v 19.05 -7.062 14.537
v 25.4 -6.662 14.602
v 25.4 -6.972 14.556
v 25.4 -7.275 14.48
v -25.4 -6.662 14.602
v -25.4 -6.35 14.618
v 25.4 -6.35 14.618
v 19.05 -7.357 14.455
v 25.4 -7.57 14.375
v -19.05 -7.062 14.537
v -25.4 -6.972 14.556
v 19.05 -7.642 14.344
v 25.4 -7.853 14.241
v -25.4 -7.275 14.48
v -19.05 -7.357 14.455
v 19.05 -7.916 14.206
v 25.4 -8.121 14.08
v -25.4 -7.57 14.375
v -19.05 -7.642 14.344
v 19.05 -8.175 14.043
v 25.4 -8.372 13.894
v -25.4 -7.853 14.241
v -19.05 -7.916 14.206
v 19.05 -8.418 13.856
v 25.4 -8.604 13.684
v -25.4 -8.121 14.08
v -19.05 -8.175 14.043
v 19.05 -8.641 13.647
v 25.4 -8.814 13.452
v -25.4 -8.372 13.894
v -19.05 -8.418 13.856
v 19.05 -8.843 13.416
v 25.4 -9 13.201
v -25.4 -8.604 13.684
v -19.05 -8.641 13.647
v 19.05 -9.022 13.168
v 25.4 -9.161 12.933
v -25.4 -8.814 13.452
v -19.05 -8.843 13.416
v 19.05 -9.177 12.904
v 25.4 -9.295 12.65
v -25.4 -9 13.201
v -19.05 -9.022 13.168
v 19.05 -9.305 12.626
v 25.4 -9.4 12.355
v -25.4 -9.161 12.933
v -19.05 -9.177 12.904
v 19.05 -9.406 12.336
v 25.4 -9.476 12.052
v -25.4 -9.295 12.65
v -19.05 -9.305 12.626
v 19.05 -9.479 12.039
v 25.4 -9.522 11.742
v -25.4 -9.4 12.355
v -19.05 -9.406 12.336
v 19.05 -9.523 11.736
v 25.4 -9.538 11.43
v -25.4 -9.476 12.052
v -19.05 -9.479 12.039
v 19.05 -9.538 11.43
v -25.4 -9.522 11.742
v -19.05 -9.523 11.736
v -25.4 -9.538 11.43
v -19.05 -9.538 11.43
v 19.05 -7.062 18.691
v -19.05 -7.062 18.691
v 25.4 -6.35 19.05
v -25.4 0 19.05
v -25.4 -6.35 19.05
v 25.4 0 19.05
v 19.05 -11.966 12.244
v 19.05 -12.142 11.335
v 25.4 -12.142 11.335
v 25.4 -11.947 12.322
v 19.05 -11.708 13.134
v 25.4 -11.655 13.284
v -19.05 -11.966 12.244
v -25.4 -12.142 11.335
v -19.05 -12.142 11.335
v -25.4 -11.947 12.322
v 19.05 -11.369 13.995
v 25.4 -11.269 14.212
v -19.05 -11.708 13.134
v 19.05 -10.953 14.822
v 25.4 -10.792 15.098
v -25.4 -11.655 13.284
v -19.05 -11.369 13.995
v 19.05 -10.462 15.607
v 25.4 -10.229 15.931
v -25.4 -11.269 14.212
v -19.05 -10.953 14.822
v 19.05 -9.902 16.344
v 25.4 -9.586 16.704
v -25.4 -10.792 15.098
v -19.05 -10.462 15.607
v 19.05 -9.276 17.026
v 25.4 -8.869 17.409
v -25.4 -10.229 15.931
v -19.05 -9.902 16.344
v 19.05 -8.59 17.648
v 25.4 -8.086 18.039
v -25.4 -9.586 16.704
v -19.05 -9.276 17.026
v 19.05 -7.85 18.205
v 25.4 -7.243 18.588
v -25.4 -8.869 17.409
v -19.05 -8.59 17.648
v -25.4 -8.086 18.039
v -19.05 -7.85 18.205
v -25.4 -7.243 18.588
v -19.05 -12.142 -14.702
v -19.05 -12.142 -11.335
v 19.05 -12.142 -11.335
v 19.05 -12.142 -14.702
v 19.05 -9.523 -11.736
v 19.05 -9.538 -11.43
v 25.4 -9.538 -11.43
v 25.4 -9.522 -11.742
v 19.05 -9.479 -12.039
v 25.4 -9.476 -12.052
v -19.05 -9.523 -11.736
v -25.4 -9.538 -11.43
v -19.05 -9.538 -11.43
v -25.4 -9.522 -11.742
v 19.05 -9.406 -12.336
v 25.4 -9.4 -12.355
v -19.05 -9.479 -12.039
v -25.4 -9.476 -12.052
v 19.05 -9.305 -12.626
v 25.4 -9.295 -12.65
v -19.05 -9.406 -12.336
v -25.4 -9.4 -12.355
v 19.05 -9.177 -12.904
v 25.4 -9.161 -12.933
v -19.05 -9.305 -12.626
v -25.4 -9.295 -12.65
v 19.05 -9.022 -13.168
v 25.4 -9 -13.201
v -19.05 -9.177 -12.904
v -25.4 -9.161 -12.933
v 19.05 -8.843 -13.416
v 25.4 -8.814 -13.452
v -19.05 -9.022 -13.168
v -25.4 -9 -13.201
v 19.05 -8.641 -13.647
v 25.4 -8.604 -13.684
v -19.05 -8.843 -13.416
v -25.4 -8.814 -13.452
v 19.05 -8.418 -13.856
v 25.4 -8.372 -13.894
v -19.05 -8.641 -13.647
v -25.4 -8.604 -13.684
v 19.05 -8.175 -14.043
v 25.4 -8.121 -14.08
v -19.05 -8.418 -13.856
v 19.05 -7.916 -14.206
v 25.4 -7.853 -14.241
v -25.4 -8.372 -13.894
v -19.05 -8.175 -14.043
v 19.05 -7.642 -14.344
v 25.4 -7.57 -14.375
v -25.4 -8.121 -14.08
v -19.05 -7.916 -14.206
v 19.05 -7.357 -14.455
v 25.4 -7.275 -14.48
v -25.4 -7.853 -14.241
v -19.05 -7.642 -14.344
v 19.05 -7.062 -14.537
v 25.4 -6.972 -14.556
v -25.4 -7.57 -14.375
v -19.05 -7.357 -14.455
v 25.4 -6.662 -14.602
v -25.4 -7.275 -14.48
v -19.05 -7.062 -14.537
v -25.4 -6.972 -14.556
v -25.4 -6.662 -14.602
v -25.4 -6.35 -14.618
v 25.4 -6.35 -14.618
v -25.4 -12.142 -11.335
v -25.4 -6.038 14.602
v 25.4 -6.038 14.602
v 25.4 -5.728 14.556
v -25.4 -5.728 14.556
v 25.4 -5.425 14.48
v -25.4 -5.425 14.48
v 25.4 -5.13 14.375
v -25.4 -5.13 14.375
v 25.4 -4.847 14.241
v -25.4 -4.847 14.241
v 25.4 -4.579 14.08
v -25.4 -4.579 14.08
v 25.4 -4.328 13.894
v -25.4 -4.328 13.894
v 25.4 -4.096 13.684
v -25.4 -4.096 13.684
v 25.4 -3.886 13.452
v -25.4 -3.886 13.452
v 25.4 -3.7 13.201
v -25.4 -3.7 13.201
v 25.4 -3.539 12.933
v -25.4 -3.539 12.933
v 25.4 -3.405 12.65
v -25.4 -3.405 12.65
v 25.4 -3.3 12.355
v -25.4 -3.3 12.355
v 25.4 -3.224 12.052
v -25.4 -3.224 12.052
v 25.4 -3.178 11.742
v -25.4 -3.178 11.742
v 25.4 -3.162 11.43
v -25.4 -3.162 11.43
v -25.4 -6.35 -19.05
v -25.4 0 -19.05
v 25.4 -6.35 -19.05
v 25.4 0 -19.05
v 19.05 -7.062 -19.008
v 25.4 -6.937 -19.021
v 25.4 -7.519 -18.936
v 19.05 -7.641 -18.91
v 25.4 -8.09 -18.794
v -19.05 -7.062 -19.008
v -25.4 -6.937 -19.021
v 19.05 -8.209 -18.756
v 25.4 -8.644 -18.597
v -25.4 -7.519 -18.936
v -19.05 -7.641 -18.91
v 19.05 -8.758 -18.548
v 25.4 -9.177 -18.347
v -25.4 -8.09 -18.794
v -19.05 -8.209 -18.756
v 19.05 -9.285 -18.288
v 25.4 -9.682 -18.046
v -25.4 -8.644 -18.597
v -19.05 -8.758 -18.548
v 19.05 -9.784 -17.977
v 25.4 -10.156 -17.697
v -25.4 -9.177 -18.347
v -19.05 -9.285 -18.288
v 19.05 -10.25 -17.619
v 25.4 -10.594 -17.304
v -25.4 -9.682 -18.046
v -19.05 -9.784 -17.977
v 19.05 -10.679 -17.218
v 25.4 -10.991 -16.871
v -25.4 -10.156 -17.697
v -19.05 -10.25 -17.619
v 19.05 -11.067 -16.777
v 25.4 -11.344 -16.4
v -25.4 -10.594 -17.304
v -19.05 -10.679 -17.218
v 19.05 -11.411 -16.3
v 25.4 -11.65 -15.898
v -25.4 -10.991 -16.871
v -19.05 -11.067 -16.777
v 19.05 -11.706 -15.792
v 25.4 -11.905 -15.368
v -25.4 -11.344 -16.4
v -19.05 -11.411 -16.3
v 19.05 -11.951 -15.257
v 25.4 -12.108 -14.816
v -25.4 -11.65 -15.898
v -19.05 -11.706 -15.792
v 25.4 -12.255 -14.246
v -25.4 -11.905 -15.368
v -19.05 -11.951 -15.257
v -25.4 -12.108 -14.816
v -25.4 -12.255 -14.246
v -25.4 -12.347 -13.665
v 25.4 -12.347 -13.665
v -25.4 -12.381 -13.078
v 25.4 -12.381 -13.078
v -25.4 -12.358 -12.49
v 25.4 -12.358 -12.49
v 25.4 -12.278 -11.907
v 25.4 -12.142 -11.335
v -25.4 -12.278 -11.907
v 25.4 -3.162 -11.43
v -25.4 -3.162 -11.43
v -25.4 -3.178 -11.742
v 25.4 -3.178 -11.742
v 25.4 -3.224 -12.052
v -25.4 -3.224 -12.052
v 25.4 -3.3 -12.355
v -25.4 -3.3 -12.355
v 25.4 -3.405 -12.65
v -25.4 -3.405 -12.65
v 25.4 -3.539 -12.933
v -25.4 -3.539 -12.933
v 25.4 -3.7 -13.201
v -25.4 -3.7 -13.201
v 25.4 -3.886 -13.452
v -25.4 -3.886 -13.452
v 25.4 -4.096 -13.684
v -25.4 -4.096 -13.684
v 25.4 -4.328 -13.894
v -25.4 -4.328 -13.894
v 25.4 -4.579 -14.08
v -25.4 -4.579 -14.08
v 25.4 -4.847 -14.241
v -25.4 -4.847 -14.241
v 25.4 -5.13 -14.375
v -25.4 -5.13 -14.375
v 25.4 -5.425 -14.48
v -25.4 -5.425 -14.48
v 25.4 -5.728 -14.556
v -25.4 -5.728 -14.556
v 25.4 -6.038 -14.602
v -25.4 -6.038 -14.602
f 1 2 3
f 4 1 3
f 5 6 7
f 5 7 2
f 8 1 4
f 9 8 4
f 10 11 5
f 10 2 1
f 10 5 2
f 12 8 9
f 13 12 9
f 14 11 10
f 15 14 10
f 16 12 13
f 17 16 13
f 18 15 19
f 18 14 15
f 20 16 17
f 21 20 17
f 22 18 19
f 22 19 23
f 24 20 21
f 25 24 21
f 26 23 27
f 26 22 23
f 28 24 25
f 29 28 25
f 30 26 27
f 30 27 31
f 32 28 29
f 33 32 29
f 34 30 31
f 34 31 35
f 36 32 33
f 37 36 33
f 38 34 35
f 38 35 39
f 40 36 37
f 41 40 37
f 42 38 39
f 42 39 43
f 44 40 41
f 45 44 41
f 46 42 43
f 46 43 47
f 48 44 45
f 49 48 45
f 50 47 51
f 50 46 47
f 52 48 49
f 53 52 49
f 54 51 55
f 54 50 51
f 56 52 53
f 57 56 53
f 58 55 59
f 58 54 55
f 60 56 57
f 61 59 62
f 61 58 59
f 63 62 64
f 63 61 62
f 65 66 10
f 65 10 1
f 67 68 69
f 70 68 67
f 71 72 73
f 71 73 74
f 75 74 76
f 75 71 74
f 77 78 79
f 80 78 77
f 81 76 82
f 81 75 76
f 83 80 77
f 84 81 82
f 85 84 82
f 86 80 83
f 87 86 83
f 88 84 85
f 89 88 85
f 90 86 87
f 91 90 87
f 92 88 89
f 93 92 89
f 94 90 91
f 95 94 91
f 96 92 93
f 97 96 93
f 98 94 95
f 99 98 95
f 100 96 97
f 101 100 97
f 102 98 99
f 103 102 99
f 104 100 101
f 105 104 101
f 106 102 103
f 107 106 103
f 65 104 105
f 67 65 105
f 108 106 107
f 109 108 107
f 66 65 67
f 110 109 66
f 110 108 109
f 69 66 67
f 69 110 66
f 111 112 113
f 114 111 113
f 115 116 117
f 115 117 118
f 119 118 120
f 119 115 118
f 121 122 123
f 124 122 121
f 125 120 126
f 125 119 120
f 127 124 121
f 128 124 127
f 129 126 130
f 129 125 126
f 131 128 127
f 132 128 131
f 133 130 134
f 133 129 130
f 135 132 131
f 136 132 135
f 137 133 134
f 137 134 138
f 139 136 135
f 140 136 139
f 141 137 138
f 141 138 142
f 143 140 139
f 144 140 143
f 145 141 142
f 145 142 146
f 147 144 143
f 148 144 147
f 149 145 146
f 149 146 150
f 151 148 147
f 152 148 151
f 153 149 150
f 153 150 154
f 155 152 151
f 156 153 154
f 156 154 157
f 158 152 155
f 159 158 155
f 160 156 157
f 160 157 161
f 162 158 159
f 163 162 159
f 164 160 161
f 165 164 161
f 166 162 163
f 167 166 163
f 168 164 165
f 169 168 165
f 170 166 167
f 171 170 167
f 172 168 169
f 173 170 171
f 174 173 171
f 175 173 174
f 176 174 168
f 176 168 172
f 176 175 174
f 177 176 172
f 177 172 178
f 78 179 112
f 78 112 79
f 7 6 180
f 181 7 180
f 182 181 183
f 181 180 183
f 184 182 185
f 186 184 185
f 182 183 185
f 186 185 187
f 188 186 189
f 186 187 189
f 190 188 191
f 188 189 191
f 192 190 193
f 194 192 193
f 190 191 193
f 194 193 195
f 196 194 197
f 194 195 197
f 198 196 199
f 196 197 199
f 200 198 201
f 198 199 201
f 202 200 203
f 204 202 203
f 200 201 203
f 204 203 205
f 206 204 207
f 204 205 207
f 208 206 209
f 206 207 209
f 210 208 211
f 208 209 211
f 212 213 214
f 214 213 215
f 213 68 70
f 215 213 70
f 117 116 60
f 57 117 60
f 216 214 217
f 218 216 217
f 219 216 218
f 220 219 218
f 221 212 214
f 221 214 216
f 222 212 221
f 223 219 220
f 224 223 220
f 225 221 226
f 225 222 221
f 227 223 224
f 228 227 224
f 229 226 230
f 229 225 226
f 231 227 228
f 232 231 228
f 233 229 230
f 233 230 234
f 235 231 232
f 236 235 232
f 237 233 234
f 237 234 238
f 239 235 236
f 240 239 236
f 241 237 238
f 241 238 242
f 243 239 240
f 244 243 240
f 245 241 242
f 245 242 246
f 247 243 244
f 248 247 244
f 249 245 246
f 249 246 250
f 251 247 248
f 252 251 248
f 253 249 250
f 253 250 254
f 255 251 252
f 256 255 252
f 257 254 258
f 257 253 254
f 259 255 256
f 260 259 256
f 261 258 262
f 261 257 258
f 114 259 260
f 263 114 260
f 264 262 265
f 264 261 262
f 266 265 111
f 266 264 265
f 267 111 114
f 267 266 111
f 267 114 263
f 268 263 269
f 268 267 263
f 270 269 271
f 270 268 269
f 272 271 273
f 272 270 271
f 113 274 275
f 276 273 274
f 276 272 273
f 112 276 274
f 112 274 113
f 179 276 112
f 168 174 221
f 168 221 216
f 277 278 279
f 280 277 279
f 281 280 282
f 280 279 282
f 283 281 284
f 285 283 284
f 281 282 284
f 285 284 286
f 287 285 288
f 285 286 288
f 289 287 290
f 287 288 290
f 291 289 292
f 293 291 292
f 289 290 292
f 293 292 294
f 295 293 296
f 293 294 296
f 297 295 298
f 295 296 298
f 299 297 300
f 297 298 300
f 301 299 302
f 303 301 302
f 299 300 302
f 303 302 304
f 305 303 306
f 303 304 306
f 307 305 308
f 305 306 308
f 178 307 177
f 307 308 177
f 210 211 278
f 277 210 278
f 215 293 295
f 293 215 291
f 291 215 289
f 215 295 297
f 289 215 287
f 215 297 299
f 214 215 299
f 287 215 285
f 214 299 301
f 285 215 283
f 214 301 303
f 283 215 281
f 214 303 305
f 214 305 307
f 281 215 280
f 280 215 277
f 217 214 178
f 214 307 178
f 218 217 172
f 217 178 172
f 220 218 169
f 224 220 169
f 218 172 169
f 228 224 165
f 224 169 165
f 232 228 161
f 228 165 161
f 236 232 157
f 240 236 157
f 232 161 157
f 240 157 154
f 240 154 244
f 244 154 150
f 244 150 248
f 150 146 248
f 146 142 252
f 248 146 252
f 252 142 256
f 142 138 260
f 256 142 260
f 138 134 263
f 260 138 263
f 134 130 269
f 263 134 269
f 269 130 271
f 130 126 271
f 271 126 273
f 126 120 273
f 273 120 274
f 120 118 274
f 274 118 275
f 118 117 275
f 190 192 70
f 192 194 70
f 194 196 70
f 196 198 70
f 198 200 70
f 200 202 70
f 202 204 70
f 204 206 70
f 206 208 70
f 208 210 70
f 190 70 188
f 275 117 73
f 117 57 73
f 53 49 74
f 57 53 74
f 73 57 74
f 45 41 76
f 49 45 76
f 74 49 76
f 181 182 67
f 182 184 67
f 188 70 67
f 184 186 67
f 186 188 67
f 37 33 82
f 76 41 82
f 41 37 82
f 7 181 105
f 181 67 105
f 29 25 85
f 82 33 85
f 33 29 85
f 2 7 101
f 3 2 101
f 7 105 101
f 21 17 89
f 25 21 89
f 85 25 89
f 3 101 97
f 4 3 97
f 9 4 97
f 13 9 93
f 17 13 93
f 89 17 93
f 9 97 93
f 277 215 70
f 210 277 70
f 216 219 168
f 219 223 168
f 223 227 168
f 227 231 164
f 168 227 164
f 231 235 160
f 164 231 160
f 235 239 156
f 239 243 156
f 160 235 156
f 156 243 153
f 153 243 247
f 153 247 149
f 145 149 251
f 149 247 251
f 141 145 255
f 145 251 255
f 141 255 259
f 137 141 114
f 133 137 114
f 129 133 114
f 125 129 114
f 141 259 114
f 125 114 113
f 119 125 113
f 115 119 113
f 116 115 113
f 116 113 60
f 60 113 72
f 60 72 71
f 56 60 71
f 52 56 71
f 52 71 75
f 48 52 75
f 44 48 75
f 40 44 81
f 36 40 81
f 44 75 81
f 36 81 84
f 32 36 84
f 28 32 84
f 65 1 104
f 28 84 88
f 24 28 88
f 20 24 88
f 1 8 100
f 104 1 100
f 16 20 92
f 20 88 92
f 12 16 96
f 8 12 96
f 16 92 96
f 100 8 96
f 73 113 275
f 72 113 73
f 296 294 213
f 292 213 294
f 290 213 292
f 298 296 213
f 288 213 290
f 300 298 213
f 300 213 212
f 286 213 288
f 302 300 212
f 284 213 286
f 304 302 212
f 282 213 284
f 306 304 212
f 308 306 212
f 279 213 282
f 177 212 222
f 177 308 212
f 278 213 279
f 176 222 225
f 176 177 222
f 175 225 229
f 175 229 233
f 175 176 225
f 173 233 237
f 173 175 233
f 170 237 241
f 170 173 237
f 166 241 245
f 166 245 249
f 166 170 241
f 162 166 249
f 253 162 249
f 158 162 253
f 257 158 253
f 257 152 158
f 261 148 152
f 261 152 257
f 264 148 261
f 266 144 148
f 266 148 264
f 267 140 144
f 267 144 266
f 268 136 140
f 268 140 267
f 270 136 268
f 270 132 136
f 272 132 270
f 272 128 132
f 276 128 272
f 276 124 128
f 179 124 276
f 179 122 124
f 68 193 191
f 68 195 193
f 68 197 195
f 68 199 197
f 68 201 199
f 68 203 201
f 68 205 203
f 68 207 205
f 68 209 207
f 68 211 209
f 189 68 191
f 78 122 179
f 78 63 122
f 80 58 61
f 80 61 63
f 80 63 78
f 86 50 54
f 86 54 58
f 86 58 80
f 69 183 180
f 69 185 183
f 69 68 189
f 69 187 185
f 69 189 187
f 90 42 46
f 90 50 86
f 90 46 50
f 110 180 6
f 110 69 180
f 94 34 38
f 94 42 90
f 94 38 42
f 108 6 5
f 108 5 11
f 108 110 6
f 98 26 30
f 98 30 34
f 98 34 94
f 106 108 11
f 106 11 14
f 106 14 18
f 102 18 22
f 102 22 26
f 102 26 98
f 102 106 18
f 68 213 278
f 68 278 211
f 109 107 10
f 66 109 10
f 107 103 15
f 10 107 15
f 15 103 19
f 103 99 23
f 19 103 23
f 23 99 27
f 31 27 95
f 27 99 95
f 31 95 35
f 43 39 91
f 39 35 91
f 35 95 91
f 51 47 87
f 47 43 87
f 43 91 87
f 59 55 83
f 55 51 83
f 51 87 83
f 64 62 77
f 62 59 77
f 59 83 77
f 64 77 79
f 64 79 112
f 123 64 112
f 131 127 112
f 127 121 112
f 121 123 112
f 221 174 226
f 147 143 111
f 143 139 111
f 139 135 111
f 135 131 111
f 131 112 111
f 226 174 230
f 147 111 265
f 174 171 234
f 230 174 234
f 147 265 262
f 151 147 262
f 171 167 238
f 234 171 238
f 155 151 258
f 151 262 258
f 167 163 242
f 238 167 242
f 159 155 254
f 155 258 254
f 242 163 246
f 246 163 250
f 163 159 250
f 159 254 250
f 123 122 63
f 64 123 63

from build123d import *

# Parameters (mm, degrees)
F0_W     = 50.8
F0_H     = 38.1
F1_DEPTH = 6.35
F3_DEPTH = 50.8
F5_DEPTH = 101.6
F6_W     = 38.1
F6_H     = 22.6706631617
F6_H_2   = 10.8896684192
F7_DEPTH = 5.08


with BuildPart() as f1:
    # F0 (on Front) → F1 (new body)
    with BuildSketch(Plane.XZ):
        Rectangle(F0_W, F0_H)
    extrude(amount=F1_DEPTH)

    # F2 (on face) → F3 (join)
    with BuildSketch(Plane(origin=(-25.4, 0, 0), x_dir=(0, -1, 0), z_dir=(-1, 0, 0))):
        with BuildLine():
            ThreePointArc((6.35, 14.6177), (8.6040442864, 13.6840442864), (9.5377, 11.43))
            ThreePointArc((9.5377, 11.43), (8.6040442864, 9.1759557136), (6.35, 8.2423))
            Line((6.35, 8.2423), (6.35, -8.2423))
            ThreePointArc((6.35, -8.2423), (8.6040442864, -9.1759557136), (9.5377, -11.43))
            ThreePointArc((9.5377, -11.43), (8.6040442864, -13.6840442864), (6.35, -14.6177))
            Line((6.35, -14.6177), (6.35, -19.05))
            ThreePointArc((6.35, -19.05), (11.173439943, -16.6397561834), (12.1419066563, -11.3353315808))
            Line((12.1419066563, -11.3353315808), (12.1419066563, 11.3353315808))
            ThreePointArc((12.1419066563, 11.3353315808), (10.2292171372, 15.9308663055), (6.35, 19.05))
            Line((6.35, 19.05), (6.35, 14.6177))
        make_face()
    extrude(amount=-F3_DEPTH)

    # F4 (on face) → F5 (cut)
    with BuildSketch(Plane(origin=(-25.4, 0, 0), x_dir=(0, -1, 0), z_dir=(-1, 0, 0))):
        with BuildLine():
            Line((6.35, 8.2423), (6.35, 14.6177))
            ThreePointArc((6.35, 14.6177), (4.0959557136, 13.6840442864), (3.1623, 11.43))
            ThreePointArc((3.1623, 11.43), (4.0959557136, 9.1759557136), (6.35, 8.2423))
        make_face()
        with BuildLine():
            ThreePointArc((6.35, 8.2423), (8.6040442864, 9.1759557136), (9.5377, 11.43))
            ThreePointArc((9.5377, 11.43), (8.6040442864, 13.6840442864), (6.35, 14.6177))
            Line((6.35, 14.6177), (6.35, 8.2423))
        make_face()
        with BuildLine():
            Line((6.35, -14.6177), (6.35, -8.2423))
            ThreePointArc((6.35, -8.2423), (4.0959557136, -9.1759557136), (3.1623, -11.43))
            ThreePointArc((3.1623, -11.43), (4.0959557136, -13.6840442864), (6.35, -14.6177))
        make_face()
        with BuildLine():
            ThreePointArc((6.35, -14.6177), (8.6040442864, -13.6840442864), (9.5377, -11.43))
            ThreePointArc((9.5377, -11.43), (8.6040442864, -9.1759557136), (6.35, -8.2423))
            Line((6.35, -8.2423), (6.35, -14.6177))
        make_face()
        with BuildLine():
            Line((9.5377, -11.43), (9.5377, 11.43))
            ThreePointArc((9.5377, 11.43), (8.6040442864, 9.1759557136), (6.35, 8.2423))
            ThreePointArc((6.35, 8.2423), (4.0959557136, 9.1759557136), (3.1623, 11.43))
            Line((3.1623, 11.43), (3.1623, -11.43))
            ThreePointArc((3.1623, -11.43), (4.0959557136, -9.1759557136), (6.35, -8.2423))
            ThreePointArc((6.35, -8.2423), (8.6040442864, -9.1759557136), (9.5377, -11.43))
        make_face()
    extrude(amount=-F5_DEPTH, mode=Mode.SUBTRACT)

    # F6 (on face) → F7 (cut)
    with BuildSketch(Plane.XZ.offset(12.1419066563)):
        Rectangle(F6_W, F6_H)
        with Locations((0, 16.7801657904)):
            Rectangle(F6_W, F6_H_2)
        with Locations((0, -16.7801657904)):
            Rectangle(F6_W, F6_H_2)
    extrude(amount=-F7_DEPTH, mode=Mode.SUBTRACT)


solid = f1.part
